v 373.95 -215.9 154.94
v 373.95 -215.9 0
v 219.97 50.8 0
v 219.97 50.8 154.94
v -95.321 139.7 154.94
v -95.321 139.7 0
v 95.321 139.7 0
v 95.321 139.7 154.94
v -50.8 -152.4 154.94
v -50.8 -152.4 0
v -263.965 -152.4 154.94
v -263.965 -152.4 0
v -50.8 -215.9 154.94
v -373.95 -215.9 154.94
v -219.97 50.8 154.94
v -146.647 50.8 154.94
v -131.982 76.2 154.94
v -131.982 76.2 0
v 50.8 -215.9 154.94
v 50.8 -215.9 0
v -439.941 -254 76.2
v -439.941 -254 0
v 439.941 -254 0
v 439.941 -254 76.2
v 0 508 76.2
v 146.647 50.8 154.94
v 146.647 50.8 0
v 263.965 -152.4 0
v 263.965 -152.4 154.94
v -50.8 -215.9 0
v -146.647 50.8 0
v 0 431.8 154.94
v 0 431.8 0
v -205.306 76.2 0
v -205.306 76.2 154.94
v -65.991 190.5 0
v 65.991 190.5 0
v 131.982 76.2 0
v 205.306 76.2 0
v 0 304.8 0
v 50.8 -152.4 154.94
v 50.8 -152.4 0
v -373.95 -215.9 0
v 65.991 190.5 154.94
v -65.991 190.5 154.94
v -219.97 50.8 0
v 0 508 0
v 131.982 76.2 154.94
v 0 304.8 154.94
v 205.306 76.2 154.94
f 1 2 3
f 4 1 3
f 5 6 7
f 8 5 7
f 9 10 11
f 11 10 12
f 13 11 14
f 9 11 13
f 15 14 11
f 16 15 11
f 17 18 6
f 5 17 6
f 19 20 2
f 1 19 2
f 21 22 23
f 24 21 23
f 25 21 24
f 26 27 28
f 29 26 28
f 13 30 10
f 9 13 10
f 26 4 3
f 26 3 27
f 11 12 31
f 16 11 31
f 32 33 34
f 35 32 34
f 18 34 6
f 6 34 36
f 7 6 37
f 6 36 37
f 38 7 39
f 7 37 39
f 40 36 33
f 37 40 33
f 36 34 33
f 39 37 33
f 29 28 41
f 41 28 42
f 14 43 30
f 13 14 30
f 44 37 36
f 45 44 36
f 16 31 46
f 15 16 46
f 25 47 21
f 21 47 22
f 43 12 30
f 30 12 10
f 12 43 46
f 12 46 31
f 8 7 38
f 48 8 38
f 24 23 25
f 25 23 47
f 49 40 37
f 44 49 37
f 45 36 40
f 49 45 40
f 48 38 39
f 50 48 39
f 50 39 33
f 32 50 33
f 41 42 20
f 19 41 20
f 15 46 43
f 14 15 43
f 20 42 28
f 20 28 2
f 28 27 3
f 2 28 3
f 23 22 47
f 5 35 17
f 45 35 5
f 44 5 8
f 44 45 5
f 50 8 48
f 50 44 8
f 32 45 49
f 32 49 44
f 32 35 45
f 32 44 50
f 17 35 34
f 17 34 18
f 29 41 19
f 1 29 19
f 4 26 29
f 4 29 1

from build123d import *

# Parameters (mm, degrees)
F1_DEPTH = 154.94
F2_DEPTH = 76.2


with BuildPart() as f1:
    # F0 (on Top) → F1 (new body)
    with BuildSketch(Plane.XY):
        Polygon((131.9822608, 76.2), (205.3057616, 76.2), (0, 431.8), (-205.3057616, 76.2), (-131.9822608, 76.2), (-95.3205358, 139.7), (95.3205358, 139.7), align=None)
        Polygon((0, 304.8), (65.9911304, 190.5), (-65.9911304, 190.5), align=None, mode=Mode.SUBTRACT)
    extrude(amount=F1_DEPTH)


with BuildPart() as f1b:
    # F0 (on Top) → F1, piece 2 (new body)
    with BuildSketch(Plane.XY):
        Polygon((-146.6469762, 50.8), (-219.9704516, 50.8), (-373.9497728, -215.9), (-50.8, -215.9), (-50.8, -152.4), (-263.964547, -152.4), align=None)
    extrude(amount=F1_DEPTH)


with BuildPart() as f1c:
    # F0 (on Top) → F1, piece 3 (new body)
    with BuildSketch(Plane.XY):
        Polygon((373.9497728, -215.9), (219.9704516, 50.8), (146.6469762, 50.8), (263.964547, -152.4), (50.8, -152.4), (50.8, -215.9), align=None)
    extrude(amount=F1_DEPTH)


with BuildPart() as f2:
    # F0 (on Top) → F2 (new body)
    with BuildSketch(Plane.XY):
        Polygon((439.9409032, -254), (381.5114571803, -152.7972303936), (225.7717787856, 116.9518065193), (219.9704516, 127), (58.4294478338, 406.7972272514), (0, 508), (-58.4294478338, 406.7972272514), (-214.1691244144, 137.0481934807), (-219.9704516, 127), (-381.5114571803, -152.7972303936), (-439.9409032, -254), (-323.0820079351, -254), (-11.6026438, -254), (0, -254), (323.0820079351, -254), align=None)
        Polygon((-373.9497728, -215.9), (-219.9704516, 50.8), (-146.6469762, 50.8), (-263.964547, -152.4), (-50.8, -152.4), (-50.8, -215.9), align=None, mode=Mode.SUBTRACT)
        Polygon((146.6469762, 50.8), (219.9704516, 50.8), (373.9497728, -215.9), (50.8, -215.9), (50.8, -152.4), (263.964547, -152.4), align=None, mode=Mode.SUBTRACT)
        Polygon((0, 431.8), (205.3057616, 76.2), (131.9822608, 76.2), (95.3205358, 139.7), (-95.3205358, 139.7), (-131.9822608, 76.2), (-205.3057616, 76.2), align=None, mode=Mode.SUBTRACT)
        Polygon((131.9822608, 76.2), (205.3057616, 76.2), (0, 431.8), (-205.3057616, 76.2), (-131.9822608, 76.2), (-95.3205358, 139.7), (95.3205358, 139.7), align=None)
        Polygon((0, 304.8), (65.9911304, 190.5), (-65.9911304, 190.5), align=None, mode=Mode.SUBTRACT)
        Polygon((373.9497728, -215.9), (219.9704516, 50.8), (146.6469762, 50.8), (263.964547, -152.4), (50.8, -152.4), (50.8, -215.9), align=None)
        Polygon((-146.6469762, 50.8), (-219.9704516, 50.8), (-373.9497728, -215.9), (-50.8, -215.9), (-50.8, -152.4), (-263.964547, -152.4), align=None)
        Polygon((-65.9911304, 190.5), (65.9911304, 190.5), (0, 304.8), align=None)
    extrude(amount=F2_DEPTH)


solid = Compound([f1.part, f1b.part, f1c.part, f2.part])
